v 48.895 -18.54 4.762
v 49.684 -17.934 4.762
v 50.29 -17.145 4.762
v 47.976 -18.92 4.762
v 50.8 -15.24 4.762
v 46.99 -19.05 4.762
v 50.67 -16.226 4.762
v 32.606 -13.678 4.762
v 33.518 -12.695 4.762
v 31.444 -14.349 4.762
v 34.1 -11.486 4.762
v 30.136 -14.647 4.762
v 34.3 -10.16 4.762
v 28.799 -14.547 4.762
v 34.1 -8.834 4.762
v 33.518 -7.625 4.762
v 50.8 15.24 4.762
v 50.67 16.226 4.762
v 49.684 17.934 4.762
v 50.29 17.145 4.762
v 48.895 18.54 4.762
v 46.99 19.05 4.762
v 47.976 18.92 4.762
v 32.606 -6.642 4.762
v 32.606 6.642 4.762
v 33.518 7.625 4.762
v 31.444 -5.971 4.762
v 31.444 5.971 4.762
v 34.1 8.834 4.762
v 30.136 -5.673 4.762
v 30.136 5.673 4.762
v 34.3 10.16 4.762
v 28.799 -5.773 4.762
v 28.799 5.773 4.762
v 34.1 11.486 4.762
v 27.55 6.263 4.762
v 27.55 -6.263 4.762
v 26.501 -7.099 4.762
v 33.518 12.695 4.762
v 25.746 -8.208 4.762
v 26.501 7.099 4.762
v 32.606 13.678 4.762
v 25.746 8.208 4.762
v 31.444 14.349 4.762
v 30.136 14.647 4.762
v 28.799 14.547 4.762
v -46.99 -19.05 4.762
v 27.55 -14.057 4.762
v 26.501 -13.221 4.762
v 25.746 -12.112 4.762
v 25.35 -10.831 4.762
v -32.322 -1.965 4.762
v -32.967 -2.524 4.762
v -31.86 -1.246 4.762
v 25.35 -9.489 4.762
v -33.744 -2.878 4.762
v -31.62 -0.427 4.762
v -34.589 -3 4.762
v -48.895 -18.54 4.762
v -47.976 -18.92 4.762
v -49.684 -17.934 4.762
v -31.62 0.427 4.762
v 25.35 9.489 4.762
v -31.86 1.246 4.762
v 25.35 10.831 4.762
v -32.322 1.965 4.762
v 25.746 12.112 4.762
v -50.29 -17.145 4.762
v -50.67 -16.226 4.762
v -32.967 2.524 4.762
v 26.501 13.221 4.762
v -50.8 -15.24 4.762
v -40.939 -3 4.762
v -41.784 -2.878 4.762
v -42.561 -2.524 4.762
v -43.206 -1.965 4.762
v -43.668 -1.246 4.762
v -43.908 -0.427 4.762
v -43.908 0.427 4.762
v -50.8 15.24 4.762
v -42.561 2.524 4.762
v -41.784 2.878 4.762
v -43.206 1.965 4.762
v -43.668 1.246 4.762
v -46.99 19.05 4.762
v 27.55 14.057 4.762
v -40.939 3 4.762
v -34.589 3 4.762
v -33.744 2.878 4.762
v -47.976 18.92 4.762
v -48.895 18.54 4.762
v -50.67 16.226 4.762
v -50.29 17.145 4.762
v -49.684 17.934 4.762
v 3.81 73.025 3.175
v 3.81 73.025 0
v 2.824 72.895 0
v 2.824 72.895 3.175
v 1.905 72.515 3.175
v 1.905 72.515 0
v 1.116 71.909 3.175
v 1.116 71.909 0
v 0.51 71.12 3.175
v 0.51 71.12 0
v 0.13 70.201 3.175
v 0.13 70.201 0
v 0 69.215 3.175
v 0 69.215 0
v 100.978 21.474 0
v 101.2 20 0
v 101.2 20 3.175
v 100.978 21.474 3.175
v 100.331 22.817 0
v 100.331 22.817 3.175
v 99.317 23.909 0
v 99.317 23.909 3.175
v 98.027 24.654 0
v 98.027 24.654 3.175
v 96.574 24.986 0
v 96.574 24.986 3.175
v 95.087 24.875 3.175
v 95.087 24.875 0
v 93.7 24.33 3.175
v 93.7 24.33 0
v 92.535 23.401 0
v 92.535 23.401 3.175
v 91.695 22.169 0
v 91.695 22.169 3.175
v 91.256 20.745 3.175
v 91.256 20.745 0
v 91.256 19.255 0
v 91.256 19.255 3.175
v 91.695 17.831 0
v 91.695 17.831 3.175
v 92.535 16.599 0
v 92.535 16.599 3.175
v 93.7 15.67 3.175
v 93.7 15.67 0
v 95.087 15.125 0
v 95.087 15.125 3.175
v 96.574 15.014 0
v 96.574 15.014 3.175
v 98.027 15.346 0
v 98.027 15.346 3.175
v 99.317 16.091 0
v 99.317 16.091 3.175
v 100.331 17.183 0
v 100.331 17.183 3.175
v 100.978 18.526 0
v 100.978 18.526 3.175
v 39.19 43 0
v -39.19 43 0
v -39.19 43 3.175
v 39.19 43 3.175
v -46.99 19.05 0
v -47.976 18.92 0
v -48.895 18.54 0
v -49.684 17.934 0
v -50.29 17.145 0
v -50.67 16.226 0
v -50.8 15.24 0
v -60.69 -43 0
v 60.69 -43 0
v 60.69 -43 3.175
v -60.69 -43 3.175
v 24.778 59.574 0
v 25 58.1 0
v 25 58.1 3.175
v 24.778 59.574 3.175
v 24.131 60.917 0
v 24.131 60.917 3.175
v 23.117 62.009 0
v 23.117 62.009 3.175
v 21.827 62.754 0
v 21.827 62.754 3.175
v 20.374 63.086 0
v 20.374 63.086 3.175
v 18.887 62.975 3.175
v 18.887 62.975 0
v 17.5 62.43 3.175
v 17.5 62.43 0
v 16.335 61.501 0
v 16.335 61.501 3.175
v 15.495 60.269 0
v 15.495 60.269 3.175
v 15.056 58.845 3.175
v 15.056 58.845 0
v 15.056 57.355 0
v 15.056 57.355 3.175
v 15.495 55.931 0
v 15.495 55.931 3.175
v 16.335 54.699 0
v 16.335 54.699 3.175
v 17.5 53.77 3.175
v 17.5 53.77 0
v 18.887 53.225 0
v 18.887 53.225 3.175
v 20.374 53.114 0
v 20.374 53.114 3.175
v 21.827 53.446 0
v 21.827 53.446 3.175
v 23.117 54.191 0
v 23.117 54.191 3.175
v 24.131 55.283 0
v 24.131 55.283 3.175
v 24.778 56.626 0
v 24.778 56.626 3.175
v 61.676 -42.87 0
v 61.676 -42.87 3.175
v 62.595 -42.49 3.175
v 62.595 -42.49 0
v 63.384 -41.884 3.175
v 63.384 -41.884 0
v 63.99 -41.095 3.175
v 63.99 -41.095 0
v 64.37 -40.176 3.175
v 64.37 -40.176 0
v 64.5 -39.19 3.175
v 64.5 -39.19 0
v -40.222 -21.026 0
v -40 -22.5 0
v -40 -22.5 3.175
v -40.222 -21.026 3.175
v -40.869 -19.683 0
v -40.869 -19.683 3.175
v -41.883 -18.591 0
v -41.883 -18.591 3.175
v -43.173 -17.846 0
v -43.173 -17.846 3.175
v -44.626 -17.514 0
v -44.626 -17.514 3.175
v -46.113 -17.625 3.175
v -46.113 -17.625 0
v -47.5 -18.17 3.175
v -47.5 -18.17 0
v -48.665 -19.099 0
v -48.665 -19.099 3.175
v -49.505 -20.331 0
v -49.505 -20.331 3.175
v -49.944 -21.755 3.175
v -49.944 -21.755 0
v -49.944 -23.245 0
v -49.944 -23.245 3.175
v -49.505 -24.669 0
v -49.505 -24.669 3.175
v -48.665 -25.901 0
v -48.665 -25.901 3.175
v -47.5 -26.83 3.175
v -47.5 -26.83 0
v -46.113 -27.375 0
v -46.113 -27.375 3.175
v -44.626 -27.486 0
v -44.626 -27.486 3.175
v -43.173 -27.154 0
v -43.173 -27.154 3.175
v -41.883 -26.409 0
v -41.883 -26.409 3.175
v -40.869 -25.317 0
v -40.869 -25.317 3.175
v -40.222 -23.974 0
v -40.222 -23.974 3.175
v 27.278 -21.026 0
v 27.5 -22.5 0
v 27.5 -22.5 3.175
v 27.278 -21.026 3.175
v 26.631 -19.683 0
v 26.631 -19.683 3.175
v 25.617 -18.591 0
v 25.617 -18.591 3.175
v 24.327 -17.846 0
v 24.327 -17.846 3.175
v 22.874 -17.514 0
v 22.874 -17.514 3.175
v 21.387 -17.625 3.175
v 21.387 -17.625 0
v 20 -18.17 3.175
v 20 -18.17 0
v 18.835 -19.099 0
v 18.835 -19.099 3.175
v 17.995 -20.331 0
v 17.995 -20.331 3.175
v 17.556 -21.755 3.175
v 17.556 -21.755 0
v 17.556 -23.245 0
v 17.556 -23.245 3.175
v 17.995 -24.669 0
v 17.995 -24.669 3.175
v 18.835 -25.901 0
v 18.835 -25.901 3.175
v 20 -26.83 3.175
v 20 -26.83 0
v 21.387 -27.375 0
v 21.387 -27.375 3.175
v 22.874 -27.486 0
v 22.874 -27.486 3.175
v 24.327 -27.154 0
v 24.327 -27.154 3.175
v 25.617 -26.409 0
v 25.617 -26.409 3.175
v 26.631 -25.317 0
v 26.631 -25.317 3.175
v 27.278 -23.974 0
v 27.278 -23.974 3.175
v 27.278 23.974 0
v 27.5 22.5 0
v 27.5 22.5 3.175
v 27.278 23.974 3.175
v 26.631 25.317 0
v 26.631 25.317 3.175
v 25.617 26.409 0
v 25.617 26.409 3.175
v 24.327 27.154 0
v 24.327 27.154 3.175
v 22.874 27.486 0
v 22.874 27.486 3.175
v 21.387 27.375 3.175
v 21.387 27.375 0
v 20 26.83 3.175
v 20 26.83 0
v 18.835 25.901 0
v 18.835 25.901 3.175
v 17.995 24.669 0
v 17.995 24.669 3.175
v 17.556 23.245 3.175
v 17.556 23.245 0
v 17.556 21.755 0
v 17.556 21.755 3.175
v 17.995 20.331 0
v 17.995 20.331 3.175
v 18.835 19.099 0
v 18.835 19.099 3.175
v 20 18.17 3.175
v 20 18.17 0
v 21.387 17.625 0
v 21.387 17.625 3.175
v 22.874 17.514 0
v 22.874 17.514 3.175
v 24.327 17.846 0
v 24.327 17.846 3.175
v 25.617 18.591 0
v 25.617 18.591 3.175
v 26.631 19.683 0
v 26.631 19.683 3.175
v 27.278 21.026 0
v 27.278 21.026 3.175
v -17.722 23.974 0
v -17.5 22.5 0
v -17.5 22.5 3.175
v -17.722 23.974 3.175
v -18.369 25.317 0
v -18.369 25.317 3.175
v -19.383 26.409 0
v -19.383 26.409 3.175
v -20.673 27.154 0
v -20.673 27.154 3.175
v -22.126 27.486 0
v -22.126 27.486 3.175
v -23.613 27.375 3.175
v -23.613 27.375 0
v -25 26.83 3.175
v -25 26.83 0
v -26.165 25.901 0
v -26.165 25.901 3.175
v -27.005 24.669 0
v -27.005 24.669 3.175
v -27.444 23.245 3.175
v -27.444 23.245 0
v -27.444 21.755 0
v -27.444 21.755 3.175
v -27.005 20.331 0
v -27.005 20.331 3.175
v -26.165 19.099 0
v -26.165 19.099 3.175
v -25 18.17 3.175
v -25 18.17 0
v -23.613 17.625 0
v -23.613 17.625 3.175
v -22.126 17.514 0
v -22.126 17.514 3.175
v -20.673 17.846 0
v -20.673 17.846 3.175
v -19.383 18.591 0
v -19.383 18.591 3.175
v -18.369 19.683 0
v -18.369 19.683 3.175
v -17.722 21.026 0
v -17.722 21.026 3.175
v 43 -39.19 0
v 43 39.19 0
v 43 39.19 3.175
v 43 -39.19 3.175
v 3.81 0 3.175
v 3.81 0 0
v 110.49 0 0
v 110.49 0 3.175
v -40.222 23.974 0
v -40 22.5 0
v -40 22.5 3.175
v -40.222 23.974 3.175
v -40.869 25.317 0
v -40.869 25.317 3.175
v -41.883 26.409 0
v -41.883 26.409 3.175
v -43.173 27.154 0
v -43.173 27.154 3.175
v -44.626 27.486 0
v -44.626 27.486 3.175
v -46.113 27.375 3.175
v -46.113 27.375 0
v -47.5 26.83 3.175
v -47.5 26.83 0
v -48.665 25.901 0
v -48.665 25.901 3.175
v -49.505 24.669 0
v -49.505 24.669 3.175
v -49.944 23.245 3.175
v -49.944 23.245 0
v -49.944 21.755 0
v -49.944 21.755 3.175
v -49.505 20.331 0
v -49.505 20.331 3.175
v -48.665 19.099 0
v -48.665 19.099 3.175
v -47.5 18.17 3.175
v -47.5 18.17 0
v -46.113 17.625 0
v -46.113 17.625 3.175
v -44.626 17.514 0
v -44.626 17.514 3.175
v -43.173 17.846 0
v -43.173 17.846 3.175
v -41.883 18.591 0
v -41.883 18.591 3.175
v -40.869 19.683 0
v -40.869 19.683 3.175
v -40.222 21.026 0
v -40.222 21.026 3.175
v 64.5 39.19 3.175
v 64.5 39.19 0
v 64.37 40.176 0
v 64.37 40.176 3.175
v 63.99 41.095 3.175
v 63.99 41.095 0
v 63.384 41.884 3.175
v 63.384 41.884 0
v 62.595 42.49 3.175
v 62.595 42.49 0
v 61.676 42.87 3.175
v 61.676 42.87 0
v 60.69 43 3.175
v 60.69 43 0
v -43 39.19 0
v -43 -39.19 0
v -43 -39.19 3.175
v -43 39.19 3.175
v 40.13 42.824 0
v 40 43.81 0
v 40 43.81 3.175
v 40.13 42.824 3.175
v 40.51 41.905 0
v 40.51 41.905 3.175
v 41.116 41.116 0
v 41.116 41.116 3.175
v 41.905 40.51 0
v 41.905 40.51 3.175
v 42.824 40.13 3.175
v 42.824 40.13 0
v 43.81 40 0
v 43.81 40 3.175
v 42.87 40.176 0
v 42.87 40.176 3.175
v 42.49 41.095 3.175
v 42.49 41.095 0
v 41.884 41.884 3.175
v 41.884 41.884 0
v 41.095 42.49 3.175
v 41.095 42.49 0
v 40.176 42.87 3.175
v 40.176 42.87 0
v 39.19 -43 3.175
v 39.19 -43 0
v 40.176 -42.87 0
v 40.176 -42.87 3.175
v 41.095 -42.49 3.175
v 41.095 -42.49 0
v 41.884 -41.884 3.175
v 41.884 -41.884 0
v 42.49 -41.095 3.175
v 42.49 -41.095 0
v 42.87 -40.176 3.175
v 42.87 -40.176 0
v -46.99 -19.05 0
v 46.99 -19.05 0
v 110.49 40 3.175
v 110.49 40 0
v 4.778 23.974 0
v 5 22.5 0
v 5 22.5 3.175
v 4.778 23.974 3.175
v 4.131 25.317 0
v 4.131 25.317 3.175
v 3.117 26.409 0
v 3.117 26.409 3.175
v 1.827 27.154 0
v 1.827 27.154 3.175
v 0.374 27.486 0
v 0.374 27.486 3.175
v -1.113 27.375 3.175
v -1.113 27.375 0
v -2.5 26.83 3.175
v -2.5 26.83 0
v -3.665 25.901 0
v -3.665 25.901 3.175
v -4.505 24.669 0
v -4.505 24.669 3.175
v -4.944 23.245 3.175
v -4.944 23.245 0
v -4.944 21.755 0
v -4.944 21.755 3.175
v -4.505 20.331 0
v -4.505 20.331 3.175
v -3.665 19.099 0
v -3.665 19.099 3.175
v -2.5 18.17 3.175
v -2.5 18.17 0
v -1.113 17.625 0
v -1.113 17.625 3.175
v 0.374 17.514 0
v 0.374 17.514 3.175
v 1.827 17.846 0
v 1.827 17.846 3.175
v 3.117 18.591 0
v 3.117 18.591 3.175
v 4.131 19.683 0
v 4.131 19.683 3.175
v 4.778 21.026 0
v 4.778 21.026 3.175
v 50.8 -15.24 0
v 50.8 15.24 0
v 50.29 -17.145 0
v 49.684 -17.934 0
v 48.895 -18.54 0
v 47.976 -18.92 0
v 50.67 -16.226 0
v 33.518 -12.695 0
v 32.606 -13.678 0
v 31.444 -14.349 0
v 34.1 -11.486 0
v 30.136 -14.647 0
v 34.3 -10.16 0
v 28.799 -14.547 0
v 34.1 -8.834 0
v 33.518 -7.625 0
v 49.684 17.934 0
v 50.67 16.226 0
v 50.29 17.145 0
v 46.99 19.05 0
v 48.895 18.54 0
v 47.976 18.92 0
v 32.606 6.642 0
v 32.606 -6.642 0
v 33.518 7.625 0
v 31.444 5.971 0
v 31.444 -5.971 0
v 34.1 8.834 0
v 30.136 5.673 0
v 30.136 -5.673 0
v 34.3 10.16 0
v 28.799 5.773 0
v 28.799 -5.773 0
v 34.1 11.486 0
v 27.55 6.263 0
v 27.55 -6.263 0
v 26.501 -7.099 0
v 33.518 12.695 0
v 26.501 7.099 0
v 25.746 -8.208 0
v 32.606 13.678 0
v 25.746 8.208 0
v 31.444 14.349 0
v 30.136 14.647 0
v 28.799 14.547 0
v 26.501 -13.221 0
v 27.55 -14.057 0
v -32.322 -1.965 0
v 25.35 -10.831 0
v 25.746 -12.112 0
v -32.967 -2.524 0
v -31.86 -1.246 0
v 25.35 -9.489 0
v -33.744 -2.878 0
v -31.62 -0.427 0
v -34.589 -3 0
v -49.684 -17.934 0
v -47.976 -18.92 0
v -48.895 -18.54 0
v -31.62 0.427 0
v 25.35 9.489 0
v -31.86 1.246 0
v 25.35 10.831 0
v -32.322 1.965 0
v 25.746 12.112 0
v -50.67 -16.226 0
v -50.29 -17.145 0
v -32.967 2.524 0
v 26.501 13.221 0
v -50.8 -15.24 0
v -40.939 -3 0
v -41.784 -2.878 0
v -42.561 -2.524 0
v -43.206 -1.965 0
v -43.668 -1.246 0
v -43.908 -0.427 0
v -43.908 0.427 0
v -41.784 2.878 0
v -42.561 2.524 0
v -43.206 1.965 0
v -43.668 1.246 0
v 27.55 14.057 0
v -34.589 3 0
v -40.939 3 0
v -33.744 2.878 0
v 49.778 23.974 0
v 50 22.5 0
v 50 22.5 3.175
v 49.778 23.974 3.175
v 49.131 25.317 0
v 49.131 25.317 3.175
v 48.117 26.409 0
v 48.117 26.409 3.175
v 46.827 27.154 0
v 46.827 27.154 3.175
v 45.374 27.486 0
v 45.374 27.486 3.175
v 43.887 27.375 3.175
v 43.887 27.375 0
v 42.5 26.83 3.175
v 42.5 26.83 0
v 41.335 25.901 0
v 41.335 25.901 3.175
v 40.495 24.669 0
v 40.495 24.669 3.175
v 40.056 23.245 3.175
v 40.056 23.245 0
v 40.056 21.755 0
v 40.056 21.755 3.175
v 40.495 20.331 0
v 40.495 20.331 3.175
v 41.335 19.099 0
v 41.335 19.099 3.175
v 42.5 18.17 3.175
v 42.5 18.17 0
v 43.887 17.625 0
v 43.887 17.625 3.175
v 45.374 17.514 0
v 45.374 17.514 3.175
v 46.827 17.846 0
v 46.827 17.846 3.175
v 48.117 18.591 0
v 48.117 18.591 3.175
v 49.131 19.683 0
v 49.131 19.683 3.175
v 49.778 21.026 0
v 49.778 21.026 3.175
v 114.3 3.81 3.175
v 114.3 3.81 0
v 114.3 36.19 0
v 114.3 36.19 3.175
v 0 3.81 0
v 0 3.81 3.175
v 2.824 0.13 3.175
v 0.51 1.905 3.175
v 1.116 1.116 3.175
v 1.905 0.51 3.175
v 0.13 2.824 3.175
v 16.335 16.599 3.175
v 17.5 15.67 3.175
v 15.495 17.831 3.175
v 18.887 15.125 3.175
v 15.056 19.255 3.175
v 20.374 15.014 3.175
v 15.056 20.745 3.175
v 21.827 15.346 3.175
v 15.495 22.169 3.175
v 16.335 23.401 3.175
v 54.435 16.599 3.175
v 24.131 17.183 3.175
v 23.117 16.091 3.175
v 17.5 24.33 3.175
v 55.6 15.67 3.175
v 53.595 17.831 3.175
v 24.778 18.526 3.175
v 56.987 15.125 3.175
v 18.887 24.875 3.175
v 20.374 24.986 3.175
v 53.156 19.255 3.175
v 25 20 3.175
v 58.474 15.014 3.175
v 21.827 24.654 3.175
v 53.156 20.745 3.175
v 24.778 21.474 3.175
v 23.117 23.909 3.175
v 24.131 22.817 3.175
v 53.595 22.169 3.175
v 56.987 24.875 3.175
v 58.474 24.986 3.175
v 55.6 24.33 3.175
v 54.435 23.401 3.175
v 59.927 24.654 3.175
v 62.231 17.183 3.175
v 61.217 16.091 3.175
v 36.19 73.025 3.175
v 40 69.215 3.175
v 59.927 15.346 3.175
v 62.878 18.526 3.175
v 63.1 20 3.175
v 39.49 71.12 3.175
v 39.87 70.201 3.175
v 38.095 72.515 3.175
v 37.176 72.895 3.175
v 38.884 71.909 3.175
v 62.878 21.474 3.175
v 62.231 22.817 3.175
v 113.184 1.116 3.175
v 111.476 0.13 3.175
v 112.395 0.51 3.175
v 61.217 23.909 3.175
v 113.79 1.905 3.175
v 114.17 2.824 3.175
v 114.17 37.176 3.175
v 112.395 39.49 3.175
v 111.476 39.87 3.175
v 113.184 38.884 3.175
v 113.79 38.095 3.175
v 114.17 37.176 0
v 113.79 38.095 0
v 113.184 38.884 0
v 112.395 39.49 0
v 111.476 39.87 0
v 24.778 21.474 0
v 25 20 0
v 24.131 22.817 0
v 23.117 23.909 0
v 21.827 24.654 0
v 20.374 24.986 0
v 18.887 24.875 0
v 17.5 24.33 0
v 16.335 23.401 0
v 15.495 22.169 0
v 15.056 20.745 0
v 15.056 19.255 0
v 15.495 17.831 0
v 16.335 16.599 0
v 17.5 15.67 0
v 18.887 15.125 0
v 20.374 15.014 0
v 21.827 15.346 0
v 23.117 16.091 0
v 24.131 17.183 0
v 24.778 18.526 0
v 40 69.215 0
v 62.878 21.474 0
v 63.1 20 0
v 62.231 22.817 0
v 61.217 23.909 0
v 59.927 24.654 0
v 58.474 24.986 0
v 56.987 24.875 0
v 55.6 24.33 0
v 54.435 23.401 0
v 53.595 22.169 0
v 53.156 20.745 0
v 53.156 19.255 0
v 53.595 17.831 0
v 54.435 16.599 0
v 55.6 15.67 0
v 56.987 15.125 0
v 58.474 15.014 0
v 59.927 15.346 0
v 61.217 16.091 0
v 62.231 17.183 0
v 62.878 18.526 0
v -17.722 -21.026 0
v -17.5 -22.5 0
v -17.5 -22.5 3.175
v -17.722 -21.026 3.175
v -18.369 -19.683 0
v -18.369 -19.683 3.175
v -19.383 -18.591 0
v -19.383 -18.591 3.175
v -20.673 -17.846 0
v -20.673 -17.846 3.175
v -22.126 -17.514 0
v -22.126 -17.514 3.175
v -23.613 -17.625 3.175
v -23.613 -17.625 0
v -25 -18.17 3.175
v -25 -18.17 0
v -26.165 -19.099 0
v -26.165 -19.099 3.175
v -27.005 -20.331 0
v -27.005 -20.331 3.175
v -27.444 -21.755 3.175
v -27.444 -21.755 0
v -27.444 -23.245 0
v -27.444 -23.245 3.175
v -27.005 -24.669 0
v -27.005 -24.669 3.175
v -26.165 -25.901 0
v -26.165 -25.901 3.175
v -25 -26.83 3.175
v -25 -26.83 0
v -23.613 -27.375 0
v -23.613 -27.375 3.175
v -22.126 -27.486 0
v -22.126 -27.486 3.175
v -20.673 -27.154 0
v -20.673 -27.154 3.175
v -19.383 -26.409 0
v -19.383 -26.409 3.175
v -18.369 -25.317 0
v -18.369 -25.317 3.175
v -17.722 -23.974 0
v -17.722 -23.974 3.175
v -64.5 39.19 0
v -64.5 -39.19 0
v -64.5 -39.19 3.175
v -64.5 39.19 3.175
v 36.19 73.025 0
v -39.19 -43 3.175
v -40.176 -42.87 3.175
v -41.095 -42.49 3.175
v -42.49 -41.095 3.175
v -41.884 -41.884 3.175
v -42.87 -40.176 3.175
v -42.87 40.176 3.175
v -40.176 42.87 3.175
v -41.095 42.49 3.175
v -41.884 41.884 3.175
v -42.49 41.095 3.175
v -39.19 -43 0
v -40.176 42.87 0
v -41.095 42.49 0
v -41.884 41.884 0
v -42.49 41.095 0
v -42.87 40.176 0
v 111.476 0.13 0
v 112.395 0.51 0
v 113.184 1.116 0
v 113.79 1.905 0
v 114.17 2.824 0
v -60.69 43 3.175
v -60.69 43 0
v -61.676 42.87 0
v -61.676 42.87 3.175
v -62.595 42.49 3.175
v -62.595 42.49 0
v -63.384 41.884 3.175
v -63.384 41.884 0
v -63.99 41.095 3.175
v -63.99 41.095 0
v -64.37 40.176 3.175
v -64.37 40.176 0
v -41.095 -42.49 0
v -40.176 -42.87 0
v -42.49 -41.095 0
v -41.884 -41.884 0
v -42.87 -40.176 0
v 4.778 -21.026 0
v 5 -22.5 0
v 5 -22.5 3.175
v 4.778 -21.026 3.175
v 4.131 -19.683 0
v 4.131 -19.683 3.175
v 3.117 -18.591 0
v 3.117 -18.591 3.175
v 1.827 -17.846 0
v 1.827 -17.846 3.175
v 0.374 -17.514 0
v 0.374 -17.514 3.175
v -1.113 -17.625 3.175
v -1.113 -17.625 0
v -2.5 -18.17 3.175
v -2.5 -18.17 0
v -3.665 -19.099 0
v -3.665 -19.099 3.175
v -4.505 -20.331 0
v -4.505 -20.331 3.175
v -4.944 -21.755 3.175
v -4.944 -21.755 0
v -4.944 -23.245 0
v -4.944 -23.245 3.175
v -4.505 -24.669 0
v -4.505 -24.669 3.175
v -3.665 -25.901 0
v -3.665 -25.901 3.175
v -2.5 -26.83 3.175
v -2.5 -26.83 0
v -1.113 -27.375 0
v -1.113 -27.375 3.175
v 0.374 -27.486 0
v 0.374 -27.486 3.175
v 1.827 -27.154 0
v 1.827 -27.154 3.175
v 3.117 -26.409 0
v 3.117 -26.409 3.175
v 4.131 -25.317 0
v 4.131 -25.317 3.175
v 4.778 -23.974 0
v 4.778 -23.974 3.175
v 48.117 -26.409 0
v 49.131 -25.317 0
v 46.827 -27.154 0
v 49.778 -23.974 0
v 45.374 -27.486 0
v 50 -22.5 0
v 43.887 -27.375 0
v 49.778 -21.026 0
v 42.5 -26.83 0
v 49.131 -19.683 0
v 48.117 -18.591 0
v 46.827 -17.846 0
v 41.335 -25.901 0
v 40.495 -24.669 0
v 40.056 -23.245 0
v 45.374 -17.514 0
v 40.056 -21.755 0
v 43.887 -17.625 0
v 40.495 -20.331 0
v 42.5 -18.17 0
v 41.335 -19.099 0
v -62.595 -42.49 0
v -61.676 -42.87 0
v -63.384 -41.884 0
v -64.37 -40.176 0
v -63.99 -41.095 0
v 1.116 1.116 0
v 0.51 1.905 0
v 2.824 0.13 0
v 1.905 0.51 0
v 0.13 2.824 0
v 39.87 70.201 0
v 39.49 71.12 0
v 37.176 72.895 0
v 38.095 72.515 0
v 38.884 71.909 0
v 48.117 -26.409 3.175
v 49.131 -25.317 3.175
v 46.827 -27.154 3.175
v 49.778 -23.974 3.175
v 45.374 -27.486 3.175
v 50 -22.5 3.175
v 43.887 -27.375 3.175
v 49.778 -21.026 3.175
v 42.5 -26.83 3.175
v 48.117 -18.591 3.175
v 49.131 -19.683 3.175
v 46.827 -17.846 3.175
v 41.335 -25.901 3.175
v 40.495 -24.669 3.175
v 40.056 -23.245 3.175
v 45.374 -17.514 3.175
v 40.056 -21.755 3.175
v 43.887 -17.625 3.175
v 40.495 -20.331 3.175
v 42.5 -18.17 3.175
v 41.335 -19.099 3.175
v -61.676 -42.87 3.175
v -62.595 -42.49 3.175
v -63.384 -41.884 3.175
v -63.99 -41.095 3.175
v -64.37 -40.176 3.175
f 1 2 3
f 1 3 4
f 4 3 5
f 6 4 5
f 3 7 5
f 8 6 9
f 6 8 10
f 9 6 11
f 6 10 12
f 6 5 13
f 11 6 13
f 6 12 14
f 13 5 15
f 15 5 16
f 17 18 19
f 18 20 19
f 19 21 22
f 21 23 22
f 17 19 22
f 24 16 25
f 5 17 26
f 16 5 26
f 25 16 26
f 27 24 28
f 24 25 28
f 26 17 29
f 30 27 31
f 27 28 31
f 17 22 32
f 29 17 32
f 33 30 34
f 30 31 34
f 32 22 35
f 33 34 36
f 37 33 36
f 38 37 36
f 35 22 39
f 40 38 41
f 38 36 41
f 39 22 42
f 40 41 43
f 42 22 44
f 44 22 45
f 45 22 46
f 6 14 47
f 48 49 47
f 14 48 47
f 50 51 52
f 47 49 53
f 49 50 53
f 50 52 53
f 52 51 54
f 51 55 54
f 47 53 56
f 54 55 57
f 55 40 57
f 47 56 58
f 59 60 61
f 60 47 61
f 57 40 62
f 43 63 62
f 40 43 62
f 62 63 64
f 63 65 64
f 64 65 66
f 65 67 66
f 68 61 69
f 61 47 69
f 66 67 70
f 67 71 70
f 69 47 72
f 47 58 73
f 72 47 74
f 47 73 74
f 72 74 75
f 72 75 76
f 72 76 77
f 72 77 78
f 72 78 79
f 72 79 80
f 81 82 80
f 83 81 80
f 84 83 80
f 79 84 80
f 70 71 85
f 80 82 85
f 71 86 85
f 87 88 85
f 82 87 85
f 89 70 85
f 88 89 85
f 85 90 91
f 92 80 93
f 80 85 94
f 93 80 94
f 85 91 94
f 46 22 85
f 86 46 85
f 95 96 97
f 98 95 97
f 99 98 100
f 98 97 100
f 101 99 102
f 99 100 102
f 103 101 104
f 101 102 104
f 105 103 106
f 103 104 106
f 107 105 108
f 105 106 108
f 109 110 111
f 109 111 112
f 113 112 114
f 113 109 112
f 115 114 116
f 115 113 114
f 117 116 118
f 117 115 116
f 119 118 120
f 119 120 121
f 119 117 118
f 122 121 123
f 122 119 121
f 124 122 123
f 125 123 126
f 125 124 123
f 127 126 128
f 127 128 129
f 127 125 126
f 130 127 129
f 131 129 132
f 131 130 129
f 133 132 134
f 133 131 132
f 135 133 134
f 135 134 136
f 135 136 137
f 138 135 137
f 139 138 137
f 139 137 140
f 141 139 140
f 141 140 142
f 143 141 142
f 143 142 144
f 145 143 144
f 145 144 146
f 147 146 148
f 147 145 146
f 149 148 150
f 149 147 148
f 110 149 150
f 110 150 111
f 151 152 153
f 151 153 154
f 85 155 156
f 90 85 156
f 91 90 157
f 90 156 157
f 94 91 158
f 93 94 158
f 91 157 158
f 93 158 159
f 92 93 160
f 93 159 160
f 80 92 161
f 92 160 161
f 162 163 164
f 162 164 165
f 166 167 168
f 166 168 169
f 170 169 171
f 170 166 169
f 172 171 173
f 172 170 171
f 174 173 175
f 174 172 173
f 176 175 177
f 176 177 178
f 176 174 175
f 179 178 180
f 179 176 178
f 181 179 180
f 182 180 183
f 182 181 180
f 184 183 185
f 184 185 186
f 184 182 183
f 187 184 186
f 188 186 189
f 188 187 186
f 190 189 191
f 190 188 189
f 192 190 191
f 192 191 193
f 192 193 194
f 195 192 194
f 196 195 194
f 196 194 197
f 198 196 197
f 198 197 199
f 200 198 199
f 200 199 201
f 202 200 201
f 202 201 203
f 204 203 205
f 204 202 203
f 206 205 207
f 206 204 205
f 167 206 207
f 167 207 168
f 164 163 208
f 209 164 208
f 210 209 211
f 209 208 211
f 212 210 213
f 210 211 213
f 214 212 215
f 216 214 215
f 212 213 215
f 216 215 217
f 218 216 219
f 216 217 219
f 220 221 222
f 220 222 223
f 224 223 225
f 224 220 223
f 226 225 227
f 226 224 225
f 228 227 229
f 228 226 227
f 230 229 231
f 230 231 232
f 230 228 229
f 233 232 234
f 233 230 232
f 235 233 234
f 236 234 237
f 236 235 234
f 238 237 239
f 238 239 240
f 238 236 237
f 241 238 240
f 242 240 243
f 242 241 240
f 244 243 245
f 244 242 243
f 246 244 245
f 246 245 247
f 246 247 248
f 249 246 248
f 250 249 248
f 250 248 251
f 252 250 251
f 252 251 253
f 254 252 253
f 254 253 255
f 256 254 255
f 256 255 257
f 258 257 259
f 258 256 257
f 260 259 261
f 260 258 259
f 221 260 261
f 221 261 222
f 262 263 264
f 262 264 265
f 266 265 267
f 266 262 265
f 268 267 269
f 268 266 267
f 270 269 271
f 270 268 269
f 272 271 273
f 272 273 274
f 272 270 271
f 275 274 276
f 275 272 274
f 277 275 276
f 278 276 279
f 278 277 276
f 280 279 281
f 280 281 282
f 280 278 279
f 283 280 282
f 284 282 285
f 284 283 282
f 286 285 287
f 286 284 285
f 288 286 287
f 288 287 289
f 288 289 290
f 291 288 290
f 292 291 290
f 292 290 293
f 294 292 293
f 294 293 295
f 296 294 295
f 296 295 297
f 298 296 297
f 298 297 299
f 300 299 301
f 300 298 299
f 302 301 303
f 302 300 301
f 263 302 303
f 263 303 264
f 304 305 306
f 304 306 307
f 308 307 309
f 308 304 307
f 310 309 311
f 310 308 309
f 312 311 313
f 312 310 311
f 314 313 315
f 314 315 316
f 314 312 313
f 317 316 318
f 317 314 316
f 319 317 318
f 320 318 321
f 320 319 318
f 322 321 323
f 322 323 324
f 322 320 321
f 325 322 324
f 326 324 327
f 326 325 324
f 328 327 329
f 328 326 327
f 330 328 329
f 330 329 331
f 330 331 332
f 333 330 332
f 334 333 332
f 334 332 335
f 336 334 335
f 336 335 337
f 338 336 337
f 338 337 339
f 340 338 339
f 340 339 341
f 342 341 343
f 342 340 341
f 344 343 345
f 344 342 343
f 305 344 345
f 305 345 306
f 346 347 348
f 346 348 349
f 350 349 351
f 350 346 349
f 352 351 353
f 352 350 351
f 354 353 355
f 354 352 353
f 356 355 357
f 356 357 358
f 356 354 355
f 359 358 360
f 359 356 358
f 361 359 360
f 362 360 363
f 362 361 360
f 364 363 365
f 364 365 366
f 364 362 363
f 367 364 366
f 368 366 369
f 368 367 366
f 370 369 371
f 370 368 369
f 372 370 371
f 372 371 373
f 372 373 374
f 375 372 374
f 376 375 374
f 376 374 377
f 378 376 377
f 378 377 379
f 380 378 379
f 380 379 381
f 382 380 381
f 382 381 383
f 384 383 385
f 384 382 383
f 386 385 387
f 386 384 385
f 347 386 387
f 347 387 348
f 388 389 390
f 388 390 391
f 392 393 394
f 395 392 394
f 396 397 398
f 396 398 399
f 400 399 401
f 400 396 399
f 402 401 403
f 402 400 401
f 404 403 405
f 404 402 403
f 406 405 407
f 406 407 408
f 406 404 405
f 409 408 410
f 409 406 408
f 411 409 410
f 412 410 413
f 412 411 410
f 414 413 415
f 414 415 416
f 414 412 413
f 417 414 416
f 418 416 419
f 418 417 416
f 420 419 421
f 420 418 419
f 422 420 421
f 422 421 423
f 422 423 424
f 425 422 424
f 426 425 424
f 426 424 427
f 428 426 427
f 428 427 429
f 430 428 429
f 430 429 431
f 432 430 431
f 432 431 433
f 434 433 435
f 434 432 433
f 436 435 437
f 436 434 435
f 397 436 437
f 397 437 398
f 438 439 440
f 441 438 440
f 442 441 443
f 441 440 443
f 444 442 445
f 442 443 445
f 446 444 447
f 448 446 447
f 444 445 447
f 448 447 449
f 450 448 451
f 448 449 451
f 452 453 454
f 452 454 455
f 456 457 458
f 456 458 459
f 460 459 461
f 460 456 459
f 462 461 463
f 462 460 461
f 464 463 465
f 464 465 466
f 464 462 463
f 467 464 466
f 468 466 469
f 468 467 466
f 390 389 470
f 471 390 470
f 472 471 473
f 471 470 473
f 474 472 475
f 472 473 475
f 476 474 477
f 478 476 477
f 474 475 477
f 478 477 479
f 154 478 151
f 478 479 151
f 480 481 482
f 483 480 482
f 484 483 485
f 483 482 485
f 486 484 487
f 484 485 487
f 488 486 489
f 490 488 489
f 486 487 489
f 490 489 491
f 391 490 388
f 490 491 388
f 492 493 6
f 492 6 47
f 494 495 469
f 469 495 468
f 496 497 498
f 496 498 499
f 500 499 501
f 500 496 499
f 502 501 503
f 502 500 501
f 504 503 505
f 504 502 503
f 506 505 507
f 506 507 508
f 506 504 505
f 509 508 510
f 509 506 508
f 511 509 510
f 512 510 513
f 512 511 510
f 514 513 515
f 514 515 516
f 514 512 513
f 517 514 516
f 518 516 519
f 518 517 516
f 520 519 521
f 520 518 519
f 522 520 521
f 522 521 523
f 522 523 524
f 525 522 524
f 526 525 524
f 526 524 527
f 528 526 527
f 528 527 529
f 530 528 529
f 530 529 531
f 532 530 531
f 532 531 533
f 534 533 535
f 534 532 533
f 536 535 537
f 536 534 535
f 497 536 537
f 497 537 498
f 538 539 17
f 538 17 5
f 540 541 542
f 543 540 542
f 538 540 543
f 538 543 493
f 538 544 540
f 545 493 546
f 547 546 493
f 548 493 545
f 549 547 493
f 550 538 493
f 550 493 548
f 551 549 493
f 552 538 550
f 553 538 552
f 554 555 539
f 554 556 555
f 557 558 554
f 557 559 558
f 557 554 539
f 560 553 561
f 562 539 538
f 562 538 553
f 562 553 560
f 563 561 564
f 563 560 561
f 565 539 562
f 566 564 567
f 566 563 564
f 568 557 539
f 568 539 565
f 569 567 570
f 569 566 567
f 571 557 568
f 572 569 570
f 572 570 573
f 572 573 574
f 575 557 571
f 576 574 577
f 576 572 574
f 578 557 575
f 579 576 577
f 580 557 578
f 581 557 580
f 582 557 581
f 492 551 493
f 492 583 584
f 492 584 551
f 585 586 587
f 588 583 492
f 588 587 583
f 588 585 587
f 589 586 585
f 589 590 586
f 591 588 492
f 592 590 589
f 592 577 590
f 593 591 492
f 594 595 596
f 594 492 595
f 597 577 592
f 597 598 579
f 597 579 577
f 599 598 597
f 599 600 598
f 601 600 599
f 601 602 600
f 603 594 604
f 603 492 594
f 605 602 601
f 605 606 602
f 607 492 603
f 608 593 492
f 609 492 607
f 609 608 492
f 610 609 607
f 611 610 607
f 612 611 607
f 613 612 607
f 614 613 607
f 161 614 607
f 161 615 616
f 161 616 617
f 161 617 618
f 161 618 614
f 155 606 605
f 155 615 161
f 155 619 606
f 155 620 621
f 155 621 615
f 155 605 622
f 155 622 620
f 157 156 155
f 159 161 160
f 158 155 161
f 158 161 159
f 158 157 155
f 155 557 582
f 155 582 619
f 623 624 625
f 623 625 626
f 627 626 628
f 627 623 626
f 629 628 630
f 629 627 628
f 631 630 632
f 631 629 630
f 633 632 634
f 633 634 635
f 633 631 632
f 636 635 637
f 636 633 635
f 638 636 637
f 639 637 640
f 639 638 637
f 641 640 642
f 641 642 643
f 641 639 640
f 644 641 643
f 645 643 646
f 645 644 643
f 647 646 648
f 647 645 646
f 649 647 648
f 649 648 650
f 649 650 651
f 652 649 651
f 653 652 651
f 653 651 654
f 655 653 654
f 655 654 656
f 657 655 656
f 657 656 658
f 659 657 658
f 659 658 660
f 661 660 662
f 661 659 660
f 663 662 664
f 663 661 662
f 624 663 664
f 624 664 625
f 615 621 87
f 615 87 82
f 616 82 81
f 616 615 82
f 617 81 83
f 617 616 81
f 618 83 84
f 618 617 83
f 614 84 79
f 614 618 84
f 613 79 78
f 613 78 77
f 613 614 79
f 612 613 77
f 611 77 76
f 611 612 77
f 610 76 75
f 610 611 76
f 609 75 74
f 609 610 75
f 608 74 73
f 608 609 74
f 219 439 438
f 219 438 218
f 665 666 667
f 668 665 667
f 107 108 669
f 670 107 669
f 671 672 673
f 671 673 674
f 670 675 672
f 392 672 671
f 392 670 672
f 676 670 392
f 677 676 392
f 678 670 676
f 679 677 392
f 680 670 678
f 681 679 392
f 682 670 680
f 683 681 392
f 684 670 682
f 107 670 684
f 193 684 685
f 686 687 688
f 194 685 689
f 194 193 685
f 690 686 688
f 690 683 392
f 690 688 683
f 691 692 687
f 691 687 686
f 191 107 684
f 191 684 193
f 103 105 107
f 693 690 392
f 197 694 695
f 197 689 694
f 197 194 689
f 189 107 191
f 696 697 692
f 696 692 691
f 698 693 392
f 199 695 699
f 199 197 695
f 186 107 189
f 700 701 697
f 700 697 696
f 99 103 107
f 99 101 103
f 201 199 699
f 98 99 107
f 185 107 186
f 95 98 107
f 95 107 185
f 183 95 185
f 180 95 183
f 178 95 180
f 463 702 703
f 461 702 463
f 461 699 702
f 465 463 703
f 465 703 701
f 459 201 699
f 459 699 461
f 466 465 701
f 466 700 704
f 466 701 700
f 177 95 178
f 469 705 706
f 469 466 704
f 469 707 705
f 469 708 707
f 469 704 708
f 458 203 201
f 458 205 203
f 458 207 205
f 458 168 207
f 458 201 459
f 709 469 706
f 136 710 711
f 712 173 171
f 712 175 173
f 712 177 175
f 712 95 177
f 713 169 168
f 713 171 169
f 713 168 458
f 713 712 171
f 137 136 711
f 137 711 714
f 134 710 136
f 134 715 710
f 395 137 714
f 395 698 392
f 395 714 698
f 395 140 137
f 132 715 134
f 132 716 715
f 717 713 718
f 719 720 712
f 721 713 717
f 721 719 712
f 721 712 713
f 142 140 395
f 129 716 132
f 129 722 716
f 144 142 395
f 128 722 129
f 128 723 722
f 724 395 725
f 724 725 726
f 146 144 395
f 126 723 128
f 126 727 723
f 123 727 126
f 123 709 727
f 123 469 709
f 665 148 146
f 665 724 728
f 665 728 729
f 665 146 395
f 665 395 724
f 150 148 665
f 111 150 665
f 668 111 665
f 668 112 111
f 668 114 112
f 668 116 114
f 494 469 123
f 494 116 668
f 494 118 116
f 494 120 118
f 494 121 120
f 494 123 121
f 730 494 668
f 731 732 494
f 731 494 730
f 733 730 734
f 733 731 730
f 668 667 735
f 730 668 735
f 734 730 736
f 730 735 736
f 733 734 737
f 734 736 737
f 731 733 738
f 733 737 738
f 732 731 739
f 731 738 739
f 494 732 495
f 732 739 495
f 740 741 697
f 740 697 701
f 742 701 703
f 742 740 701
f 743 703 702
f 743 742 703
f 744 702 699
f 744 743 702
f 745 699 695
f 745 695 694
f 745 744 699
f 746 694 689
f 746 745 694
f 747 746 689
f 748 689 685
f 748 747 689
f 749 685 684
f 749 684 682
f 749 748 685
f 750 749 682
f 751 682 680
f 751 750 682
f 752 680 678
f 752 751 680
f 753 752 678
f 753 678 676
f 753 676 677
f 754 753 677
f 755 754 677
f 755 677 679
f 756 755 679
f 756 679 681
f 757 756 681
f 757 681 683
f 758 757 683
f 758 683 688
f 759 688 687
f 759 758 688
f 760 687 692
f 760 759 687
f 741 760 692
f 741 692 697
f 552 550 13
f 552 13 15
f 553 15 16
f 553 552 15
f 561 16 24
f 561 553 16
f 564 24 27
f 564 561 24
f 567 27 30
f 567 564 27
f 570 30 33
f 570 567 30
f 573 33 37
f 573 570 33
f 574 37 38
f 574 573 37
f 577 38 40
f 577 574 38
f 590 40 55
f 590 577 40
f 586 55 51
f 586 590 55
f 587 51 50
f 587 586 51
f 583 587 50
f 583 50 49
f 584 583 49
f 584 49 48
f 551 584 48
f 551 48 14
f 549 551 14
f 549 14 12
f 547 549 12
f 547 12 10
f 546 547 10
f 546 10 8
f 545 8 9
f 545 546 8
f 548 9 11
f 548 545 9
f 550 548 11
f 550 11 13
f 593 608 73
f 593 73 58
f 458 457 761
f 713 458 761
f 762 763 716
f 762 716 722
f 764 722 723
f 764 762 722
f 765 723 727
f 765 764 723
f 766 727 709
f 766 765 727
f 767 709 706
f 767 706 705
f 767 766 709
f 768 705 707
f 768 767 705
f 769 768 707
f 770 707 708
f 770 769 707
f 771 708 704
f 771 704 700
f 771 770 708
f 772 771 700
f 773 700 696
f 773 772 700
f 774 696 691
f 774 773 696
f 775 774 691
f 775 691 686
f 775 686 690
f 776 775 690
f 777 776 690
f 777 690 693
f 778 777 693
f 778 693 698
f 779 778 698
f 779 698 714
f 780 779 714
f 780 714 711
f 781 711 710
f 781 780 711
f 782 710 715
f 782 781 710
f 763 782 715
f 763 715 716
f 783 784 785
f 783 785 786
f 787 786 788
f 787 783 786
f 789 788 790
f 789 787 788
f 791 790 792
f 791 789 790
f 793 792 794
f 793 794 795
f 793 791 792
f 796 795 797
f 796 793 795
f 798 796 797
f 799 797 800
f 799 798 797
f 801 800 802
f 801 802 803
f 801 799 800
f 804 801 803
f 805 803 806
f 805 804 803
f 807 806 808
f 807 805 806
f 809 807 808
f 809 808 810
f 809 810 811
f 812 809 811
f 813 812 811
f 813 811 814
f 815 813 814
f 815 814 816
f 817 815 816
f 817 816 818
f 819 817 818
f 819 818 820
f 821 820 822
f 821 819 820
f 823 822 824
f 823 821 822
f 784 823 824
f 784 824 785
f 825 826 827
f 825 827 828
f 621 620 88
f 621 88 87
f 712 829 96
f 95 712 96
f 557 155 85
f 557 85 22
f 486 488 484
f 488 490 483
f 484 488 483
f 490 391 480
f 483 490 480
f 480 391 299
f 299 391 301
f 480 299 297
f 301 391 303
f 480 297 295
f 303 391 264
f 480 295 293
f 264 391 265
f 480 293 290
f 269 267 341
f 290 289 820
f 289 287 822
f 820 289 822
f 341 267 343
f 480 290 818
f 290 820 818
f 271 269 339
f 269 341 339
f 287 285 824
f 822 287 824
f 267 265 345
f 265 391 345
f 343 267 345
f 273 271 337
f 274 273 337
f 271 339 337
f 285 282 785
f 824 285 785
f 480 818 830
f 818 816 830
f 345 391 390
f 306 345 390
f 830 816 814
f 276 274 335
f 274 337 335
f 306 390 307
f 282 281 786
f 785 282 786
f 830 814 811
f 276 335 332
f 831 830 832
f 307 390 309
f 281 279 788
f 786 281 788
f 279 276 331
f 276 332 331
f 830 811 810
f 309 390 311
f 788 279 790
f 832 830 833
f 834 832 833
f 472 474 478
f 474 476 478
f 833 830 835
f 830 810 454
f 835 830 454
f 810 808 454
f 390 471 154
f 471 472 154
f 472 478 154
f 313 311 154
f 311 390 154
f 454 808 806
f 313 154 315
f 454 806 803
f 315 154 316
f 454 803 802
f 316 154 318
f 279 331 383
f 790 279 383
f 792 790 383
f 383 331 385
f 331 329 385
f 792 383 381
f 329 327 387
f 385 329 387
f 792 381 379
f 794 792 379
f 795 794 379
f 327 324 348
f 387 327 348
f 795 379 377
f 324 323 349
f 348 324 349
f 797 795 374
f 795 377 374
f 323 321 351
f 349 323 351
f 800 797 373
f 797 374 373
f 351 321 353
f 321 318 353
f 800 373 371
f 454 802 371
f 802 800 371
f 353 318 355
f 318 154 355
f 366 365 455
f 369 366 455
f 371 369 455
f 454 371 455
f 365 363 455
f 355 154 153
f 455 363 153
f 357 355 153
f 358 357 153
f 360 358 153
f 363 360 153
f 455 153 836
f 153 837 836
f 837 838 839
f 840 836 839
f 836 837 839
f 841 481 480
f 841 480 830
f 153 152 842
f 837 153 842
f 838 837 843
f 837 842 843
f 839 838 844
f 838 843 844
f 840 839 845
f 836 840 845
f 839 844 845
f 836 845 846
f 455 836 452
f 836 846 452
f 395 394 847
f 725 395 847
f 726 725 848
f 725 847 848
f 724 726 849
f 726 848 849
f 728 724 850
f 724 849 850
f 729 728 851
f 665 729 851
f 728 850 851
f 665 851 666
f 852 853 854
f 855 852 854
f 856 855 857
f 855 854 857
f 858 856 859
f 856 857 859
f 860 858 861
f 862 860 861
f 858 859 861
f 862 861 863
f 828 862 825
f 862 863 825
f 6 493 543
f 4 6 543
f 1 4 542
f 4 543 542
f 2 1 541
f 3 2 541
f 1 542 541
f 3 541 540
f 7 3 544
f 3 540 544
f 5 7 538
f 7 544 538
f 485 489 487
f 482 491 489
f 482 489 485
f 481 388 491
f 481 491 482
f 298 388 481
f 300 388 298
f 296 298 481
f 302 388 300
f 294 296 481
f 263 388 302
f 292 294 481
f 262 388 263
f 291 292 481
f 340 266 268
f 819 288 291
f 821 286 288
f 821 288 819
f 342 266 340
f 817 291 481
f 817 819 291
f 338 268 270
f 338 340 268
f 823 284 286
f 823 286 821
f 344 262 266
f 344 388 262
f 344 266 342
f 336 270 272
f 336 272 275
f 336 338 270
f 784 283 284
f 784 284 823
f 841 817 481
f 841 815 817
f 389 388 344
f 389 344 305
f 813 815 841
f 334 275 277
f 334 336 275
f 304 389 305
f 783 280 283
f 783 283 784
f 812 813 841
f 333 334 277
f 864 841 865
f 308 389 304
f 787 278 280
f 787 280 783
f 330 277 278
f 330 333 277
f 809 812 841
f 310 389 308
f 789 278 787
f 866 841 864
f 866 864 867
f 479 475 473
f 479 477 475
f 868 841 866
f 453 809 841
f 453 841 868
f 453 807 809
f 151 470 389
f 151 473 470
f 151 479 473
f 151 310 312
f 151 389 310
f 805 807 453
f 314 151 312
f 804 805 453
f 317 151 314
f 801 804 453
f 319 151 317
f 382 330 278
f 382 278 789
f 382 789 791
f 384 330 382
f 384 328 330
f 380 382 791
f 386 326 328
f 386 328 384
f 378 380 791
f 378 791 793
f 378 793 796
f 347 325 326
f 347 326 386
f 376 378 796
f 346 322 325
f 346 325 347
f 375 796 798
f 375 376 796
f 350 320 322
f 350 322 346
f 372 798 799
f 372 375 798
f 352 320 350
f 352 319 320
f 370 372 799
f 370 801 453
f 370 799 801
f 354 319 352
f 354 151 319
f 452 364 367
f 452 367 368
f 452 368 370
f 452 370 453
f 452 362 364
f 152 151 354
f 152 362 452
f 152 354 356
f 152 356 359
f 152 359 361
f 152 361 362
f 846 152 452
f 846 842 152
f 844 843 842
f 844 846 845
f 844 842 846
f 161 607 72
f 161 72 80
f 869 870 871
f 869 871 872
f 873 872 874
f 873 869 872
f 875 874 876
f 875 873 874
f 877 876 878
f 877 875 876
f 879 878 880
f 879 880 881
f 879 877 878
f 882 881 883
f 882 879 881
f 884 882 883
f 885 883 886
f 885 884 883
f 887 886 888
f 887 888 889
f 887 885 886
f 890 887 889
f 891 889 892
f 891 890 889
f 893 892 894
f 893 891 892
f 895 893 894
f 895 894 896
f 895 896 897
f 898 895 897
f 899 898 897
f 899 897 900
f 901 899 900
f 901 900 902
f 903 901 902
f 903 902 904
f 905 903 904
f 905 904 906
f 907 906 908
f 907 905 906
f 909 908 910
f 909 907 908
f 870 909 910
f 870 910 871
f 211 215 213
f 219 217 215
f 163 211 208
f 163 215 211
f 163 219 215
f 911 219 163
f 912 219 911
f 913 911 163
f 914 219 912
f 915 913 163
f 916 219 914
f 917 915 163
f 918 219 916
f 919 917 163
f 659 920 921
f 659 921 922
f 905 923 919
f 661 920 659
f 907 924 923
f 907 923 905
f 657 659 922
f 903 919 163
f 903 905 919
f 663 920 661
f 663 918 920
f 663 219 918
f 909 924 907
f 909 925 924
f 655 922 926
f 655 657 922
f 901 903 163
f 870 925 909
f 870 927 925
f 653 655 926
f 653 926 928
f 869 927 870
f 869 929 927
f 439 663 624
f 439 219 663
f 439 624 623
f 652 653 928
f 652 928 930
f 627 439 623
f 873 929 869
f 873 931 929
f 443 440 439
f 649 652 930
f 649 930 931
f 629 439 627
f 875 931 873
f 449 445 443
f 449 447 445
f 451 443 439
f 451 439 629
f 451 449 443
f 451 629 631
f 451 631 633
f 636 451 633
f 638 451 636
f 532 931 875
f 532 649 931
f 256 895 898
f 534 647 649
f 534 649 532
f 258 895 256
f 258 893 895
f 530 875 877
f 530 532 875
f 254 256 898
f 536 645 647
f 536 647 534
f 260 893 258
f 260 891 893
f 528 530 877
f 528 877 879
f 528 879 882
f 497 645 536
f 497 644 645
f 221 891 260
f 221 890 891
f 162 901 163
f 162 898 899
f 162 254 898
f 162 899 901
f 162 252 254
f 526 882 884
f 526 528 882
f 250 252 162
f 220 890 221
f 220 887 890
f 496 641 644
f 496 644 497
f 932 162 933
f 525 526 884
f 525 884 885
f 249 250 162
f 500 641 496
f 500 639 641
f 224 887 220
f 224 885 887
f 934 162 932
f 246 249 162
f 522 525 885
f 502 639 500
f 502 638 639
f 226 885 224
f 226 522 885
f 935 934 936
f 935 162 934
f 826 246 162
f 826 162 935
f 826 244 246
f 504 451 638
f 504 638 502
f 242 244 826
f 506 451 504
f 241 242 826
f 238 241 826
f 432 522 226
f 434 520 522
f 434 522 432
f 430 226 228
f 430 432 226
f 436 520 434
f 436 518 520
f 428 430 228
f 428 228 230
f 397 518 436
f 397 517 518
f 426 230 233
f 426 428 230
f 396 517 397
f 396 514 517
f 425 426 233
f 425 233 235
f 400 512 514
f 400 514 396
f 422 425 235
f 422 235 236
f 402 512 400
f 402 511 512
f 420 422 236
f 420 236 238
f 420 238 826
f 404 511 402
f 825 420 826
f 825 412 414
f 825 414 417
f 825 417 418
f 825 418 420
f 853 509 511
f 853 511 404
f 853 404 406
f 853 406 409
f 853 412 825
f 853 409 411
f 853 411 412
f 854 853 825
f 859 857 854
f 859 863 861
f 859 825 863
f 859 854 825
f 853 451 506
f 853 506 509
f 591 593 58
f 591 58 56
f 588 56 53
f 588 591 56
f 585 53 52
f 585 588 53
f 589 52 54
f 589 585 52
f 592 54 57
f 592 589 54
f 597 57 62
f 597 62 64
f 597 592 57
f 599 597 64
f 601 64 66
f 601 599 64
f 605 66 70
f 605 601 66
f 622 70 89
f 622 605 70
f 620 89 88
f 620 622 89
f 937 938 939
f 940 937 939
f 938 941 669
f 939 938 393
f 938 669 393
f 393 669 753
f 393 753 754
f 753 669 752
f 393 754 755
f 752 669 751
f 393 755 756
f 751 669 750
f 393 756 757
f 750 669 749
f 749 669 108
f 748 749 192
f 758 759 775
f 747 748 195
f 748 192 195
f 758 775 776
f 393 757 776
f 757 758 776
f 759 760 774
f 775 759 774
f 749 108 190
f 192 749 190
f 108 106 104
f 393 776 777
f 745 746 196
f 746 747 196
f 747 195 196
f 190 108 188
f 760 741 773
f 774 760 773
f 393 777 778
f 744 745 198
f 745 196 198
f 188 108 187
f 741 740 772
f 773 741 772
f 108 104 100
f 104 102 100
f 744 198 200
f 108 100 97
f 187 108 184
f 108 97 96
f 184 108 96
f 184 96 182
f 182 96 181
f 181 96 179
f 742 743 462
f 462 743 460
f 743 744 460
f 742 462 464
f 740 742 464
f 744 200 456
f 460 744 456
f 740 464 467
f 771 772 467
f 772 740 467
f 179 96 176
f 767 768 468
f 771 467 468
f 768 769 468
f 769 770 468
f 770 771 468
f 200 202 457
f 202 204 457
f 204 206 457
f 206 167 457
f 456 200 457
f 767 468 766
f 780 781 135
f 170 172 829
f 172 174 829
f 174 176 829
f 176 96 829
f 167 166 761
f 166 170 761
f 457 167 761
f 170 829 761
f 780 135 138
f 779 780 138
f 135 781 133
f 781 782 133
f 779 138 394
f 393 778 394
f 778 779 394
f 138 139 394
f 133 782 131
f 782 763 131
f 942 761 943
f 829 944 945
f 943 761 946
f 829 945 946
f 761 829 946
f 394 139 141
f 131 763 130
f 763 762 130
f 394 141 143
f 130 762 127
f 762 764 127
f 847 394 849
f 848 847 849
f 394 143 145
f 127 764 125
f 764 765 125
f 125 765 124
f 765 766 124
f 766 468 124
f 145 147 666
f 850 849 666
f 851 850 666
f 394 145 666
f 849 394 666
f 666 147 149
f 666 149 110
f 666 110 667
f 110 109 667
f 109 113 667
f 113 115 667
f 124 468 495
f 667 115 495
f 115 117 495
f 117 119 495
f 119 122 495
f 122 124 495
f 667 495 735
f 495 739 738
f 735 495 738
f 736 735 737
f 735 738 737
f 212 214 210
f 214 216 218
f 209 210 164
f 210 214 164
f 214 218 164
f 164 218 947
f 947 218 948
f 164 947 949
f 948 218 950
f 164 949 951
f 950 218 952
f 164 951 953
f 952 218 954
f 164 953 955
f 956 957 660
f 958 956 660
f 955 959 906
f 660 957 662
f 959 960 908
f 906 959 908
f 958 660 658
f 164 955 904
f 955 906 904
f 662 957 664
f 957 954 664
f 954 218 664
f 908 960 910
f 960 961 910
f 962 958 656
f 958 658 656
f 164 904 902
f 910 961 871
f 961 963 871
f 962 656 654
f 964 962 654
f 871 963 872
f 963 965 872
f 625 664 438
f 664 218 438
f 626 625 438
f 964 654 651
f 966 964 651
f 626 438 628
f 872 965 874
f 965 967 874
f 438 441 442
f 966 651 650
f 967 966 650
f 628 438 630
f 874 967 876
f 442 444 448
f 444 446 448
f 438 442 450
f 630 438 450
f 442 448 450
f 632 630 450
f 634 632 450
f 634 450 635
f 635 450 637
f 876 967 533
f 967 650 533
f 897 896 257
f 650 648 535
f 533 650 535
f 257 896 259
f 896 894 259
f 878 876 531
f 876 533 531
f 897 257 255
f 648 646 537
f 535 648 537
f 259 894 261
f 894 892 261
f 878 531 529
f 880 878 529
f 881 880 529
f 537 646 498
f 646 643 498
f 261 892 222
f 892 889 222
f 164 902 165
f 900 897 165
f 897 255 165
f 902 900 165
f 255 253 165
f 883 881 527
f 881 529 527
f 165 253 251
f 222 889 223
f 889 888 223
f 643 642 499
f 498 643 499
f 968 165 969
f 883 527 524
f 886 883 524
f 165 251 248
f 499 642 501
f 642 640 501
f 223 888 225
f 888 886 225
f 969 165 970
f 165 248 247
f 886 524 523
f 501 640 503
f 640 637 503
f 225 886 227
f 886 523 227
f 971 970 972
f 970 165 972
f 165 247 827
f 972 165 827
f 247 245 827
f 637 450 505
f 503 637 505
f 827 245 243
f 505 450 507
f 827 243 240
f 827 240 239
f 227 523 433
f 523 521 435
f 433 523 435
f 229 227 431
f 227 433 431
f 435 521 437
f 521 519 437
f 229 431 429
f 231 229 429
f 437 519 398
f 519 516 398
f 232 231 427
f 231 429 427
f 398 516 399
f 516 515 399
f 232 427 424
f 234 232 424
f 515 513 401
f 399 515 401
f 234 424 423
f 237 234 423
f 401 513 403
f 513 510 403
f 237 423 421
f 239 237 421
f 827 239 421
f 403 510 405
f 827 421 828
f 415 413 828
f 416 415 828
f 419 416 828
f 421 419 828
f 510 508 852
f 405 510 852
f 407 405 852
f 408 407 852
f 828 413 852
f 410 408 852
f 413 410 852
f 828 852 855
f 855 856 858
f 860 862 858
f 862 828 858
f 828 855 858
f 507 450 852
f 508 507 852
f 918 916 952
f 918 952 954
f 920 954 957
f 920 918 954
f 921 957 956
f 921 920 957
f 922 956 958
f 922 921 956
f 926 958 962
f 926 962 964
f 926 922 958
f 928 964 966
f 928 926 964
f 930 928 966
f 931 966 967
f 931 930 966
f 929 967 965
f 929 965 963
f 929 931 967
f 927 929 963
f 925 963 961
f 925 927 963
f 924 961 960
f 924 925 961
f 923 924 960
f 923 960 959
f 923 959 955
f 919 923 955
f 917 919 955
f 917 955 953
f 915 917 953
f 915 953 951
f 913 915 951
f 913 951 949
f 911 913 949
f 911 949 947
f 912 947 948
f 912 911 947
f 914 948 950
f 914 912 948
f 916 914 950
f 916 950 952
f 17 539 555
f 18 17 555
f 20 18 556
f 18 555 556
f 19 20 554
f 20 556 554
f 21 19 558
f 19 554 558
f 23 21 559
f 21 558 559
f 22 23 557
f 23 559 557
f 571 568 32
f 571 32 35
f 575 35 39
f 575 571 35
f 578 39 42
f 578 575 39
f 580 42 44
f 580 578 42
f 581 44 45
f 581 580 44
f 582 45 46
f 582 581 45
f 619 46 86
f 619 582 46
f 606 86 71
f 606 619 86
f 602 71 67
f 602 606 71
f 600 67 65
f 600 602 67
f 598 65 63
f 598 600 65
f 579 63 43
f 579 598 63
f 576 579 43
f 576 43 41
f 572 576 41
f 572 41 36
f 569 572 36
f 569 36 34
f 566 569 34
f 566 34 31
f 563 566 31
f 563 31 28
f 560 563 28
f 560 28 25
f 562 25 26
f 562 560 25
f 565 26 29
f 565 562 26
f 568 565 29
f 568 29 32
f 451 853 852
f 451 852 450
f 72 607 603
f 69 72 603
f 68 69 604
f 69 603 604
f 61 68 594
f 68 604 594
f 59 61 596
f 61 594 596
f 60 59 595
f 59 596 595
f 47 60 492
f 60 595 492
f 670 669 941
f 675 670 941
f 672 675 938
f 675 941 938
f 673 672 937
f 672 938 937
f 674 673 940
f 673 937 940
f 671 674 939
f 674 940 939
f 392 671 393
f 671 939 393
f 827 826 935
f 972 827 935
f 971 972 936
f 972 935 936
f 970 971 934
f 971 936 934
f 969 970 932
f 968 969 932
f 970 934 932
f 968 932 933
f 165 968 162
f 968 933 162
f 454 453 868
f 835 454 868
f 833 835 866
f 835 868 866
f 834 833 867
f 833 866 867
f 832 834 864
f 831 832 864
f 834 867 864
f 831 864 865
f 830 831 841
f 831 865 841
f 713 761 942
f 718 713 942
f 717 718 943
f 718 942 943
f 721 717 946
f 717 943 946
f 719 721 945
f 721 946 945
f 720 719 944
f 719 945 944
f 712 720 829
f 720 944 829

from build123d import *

# Parameters (mm, degrees)
SKETCH_R     = 5
PAD_DEPTH    = 3.175
SKETCH001_R  = 5
PAD001_DEPTH = 3.175
SKETCH002_R  = 5
PAD002_DEPTH = 3.175
SKETCH003_R  = 4.5
PAD003_DEPTH = 4.7625


with BuildPart() as f_4_hole_plate:
    # Sketch → Pad (new body)
    with BuildSketch(Plane.XY):
        with BuildLine():
            Line((-39.19, 43), (39.19, 43))
            ThreePointArc((43, 39.19), (41.884077, 41.884077), (39.19, 43))
            Line((43, 39.19), (43, -39.19))
            ThreePointArc((39.19, -43), (41.884077, -41.884077), (43, -39.19))
            Line((39.19, -43), (-39.19, -43))
            ThreePointArc((-43, -39.19), (-41.884077, -41.884077), (-39.19, -43))
            Line((-43, -39.19), (-43, 39.19))
            ThreePointArc((-39.19, 43), (-41.884077, 41.884077), (-43, 39.19))
        make_face()
        with Locations((-22.5, 22.5)):
            Circle(SKETCH_R, mode=Mode.SUBTRACT)
        with Locations((22.5, 22.5)):
            Circle(SKETCH_R, mode=Mode.SUBTRACT)
        with Locations((22.5, -22.5)):
            Circle(SKETCH_R, mode=Mode.SUBTRACT)
        with Locations((-22.5, -22.5)):
            Circle(SKETCH_R, mode=Mode.SUBTRACT)
    extrude(amount=PAD_DEPTH)


with BuildPart() as l_bracket:
    # Sketch001 → Pad001 (new body)
    with BuildSketch(Plane.XY):
        with BuildLine():
            Line((0, 69.215), (0, 3.81))
            ThreePointArc((0, 3.81), (1.115923, 1.115923), (3.81, 0))
            Line((3.81, 0), (110.49, 0))
            ThreePointArc((110.49, 0), (113.184077, 1.115923), (114.3, 3.81))
            Line((114.3, 3.81), (114.3, 36.19))
            ThreePointArc((114.3, 36.19), (113.184077, 38.884077), (110.49, 40))
            Line((110.49, 40), (43.81, 40))
            ThreePointArc((40, 43.81), (41.115923, 41.115923), (43.81, 40))
            Line((40, 43.81), (40, 69.215))
            ThreePointArc((40, 69.215), (38.884077, 71.909077), (36.19, 73.025))
            Line((36.19, 73.025), (3.81, 73.025))
            ThreePointArc((3.81, 73.025), (1.115923, 71.909077), (0, 69.215))
        make_face()
        with Locations((20, 58.1)):
            Circle(SKETCH001_R, mode=Mode.SUBTRACT)
        with Locations((20, 20)):
            Circle(SKETCH001_R, mode=Mode.SUBTRACT)
        with Locations((58.1, 20)):
            Circle(SKETCH001_R, mode=Mode.SUBTRACT)
        with Locations((96.2, 20)):
            Circle(SKETCH001_R, mode=Mode.SUBTRACT)
    extrude(amount=PAD001_DEPTH)


with BuildPart() as f_6_hole_plate002:
    # Sketch002 → Pad002 (new body)
    with BuildSketch(Plane.XY):
        with BuildLine():
            Line((-60.69, 43), (60.69, 43))
            ThreePointArc((64.5, 39.19), (63.384077, 41.884077), (60.69, 43))
            Line((64.5, 39.19), (64.5, -39.19))
            ThreePointArc((60.69, -43), (63.384077, -41.884077), (64.5, -39.19))
            Line((60.69, -43), (-60.69, -43))
            ThreePointArc((-64.5, -39.19), (-63.384077, -41.884077), (-60.69, -43))
            Line((-64.5, -39.19), (-64.5, 39.19))
            ThreePointArc((-60.69, 43), (-63.384077, 41.884077), (-64.5, 39.19))
        make_face()
        with Locations((-45, 22.5)):
            Circle(SKETCH002_R, mode=Mode.SUBTRACT)
        with Locations((0, 22.5)):
            Circle(SKETCH002_R, mode=Mode.SUBTRACT)
        with Locations((0, -22.5)):
            Circle(SKETCH002_R, mode=Mode.SUBTRACT)
        with Locations((-45, -22.5)):
            Circle(SKETCH002_R, mode=Mode.SUBTRACT)
        with Locations((45, 22.5)):
            Circle(SKETCH002_R, mode=Mode.SUBTRACT)
        with Locations((45, -22.5)):
            Circle(SKETCH002_R, mode=Mode.SUBTRACT)
    extrude(amount=PAD002_DEPTH)


with BuildPart() as window_trolley_bracket:
    # Sketch003 → Pad003 (new body)
    with BuildSketch(Plane.XY):
        with BuildLine():
            Line((-46.99, 19.05), (46.99, 19.05))
            ThreePointArc((50.8, 15.24), (49.684077, 17.934077), (46.99, 19.05))
            Line((50.8, 15.24), (50.8, -15.24))
            ThreePointArc((46.99, -19.05), (49.684077, -17.934077), (50.8, -15.24))
            Line((46.99, -19.05), (-46.99, -19.05))
            ThreePointArc((-50.8, -15.24), (-49.684077, -17.934077), (-46.99, -19.05))
            Line((-50.8, -15.24), (-50.8, 15.24))
            ThreePointArc((-46.99, 19.05), (-49.684077, 17.934077), (-50.8, 15.24))
        make_face()
        with Locations((29.8, 10.16)):
            Circle(SKETCH003_R, mode=Mode.SUBTRACT)
        with Locations((29.8, -10.16)):
            Circle(SKETCH003_R, mode=Mode.SUBTRACT)
        with BuildLine():
            ThreePointArc((-40.939, 3), (-43.939, 0), (-40.939, -3))
            Line((-40.939, -3), (-34.589, -3))
            ThreePointArc((-34.589, -3), (-31.589, 0), (-34.589, 3))
            Line((-34.589, 3), (-40.939, 3))
        make_face(mode=Mode.SUBTRACT)
    extrude(amount=PAD003_DEPTH)


solid = Compound([f_4_hole_plate.part, l_bracket.part, f_6_hole_plate002.part, window_trolley_bracket.part])
